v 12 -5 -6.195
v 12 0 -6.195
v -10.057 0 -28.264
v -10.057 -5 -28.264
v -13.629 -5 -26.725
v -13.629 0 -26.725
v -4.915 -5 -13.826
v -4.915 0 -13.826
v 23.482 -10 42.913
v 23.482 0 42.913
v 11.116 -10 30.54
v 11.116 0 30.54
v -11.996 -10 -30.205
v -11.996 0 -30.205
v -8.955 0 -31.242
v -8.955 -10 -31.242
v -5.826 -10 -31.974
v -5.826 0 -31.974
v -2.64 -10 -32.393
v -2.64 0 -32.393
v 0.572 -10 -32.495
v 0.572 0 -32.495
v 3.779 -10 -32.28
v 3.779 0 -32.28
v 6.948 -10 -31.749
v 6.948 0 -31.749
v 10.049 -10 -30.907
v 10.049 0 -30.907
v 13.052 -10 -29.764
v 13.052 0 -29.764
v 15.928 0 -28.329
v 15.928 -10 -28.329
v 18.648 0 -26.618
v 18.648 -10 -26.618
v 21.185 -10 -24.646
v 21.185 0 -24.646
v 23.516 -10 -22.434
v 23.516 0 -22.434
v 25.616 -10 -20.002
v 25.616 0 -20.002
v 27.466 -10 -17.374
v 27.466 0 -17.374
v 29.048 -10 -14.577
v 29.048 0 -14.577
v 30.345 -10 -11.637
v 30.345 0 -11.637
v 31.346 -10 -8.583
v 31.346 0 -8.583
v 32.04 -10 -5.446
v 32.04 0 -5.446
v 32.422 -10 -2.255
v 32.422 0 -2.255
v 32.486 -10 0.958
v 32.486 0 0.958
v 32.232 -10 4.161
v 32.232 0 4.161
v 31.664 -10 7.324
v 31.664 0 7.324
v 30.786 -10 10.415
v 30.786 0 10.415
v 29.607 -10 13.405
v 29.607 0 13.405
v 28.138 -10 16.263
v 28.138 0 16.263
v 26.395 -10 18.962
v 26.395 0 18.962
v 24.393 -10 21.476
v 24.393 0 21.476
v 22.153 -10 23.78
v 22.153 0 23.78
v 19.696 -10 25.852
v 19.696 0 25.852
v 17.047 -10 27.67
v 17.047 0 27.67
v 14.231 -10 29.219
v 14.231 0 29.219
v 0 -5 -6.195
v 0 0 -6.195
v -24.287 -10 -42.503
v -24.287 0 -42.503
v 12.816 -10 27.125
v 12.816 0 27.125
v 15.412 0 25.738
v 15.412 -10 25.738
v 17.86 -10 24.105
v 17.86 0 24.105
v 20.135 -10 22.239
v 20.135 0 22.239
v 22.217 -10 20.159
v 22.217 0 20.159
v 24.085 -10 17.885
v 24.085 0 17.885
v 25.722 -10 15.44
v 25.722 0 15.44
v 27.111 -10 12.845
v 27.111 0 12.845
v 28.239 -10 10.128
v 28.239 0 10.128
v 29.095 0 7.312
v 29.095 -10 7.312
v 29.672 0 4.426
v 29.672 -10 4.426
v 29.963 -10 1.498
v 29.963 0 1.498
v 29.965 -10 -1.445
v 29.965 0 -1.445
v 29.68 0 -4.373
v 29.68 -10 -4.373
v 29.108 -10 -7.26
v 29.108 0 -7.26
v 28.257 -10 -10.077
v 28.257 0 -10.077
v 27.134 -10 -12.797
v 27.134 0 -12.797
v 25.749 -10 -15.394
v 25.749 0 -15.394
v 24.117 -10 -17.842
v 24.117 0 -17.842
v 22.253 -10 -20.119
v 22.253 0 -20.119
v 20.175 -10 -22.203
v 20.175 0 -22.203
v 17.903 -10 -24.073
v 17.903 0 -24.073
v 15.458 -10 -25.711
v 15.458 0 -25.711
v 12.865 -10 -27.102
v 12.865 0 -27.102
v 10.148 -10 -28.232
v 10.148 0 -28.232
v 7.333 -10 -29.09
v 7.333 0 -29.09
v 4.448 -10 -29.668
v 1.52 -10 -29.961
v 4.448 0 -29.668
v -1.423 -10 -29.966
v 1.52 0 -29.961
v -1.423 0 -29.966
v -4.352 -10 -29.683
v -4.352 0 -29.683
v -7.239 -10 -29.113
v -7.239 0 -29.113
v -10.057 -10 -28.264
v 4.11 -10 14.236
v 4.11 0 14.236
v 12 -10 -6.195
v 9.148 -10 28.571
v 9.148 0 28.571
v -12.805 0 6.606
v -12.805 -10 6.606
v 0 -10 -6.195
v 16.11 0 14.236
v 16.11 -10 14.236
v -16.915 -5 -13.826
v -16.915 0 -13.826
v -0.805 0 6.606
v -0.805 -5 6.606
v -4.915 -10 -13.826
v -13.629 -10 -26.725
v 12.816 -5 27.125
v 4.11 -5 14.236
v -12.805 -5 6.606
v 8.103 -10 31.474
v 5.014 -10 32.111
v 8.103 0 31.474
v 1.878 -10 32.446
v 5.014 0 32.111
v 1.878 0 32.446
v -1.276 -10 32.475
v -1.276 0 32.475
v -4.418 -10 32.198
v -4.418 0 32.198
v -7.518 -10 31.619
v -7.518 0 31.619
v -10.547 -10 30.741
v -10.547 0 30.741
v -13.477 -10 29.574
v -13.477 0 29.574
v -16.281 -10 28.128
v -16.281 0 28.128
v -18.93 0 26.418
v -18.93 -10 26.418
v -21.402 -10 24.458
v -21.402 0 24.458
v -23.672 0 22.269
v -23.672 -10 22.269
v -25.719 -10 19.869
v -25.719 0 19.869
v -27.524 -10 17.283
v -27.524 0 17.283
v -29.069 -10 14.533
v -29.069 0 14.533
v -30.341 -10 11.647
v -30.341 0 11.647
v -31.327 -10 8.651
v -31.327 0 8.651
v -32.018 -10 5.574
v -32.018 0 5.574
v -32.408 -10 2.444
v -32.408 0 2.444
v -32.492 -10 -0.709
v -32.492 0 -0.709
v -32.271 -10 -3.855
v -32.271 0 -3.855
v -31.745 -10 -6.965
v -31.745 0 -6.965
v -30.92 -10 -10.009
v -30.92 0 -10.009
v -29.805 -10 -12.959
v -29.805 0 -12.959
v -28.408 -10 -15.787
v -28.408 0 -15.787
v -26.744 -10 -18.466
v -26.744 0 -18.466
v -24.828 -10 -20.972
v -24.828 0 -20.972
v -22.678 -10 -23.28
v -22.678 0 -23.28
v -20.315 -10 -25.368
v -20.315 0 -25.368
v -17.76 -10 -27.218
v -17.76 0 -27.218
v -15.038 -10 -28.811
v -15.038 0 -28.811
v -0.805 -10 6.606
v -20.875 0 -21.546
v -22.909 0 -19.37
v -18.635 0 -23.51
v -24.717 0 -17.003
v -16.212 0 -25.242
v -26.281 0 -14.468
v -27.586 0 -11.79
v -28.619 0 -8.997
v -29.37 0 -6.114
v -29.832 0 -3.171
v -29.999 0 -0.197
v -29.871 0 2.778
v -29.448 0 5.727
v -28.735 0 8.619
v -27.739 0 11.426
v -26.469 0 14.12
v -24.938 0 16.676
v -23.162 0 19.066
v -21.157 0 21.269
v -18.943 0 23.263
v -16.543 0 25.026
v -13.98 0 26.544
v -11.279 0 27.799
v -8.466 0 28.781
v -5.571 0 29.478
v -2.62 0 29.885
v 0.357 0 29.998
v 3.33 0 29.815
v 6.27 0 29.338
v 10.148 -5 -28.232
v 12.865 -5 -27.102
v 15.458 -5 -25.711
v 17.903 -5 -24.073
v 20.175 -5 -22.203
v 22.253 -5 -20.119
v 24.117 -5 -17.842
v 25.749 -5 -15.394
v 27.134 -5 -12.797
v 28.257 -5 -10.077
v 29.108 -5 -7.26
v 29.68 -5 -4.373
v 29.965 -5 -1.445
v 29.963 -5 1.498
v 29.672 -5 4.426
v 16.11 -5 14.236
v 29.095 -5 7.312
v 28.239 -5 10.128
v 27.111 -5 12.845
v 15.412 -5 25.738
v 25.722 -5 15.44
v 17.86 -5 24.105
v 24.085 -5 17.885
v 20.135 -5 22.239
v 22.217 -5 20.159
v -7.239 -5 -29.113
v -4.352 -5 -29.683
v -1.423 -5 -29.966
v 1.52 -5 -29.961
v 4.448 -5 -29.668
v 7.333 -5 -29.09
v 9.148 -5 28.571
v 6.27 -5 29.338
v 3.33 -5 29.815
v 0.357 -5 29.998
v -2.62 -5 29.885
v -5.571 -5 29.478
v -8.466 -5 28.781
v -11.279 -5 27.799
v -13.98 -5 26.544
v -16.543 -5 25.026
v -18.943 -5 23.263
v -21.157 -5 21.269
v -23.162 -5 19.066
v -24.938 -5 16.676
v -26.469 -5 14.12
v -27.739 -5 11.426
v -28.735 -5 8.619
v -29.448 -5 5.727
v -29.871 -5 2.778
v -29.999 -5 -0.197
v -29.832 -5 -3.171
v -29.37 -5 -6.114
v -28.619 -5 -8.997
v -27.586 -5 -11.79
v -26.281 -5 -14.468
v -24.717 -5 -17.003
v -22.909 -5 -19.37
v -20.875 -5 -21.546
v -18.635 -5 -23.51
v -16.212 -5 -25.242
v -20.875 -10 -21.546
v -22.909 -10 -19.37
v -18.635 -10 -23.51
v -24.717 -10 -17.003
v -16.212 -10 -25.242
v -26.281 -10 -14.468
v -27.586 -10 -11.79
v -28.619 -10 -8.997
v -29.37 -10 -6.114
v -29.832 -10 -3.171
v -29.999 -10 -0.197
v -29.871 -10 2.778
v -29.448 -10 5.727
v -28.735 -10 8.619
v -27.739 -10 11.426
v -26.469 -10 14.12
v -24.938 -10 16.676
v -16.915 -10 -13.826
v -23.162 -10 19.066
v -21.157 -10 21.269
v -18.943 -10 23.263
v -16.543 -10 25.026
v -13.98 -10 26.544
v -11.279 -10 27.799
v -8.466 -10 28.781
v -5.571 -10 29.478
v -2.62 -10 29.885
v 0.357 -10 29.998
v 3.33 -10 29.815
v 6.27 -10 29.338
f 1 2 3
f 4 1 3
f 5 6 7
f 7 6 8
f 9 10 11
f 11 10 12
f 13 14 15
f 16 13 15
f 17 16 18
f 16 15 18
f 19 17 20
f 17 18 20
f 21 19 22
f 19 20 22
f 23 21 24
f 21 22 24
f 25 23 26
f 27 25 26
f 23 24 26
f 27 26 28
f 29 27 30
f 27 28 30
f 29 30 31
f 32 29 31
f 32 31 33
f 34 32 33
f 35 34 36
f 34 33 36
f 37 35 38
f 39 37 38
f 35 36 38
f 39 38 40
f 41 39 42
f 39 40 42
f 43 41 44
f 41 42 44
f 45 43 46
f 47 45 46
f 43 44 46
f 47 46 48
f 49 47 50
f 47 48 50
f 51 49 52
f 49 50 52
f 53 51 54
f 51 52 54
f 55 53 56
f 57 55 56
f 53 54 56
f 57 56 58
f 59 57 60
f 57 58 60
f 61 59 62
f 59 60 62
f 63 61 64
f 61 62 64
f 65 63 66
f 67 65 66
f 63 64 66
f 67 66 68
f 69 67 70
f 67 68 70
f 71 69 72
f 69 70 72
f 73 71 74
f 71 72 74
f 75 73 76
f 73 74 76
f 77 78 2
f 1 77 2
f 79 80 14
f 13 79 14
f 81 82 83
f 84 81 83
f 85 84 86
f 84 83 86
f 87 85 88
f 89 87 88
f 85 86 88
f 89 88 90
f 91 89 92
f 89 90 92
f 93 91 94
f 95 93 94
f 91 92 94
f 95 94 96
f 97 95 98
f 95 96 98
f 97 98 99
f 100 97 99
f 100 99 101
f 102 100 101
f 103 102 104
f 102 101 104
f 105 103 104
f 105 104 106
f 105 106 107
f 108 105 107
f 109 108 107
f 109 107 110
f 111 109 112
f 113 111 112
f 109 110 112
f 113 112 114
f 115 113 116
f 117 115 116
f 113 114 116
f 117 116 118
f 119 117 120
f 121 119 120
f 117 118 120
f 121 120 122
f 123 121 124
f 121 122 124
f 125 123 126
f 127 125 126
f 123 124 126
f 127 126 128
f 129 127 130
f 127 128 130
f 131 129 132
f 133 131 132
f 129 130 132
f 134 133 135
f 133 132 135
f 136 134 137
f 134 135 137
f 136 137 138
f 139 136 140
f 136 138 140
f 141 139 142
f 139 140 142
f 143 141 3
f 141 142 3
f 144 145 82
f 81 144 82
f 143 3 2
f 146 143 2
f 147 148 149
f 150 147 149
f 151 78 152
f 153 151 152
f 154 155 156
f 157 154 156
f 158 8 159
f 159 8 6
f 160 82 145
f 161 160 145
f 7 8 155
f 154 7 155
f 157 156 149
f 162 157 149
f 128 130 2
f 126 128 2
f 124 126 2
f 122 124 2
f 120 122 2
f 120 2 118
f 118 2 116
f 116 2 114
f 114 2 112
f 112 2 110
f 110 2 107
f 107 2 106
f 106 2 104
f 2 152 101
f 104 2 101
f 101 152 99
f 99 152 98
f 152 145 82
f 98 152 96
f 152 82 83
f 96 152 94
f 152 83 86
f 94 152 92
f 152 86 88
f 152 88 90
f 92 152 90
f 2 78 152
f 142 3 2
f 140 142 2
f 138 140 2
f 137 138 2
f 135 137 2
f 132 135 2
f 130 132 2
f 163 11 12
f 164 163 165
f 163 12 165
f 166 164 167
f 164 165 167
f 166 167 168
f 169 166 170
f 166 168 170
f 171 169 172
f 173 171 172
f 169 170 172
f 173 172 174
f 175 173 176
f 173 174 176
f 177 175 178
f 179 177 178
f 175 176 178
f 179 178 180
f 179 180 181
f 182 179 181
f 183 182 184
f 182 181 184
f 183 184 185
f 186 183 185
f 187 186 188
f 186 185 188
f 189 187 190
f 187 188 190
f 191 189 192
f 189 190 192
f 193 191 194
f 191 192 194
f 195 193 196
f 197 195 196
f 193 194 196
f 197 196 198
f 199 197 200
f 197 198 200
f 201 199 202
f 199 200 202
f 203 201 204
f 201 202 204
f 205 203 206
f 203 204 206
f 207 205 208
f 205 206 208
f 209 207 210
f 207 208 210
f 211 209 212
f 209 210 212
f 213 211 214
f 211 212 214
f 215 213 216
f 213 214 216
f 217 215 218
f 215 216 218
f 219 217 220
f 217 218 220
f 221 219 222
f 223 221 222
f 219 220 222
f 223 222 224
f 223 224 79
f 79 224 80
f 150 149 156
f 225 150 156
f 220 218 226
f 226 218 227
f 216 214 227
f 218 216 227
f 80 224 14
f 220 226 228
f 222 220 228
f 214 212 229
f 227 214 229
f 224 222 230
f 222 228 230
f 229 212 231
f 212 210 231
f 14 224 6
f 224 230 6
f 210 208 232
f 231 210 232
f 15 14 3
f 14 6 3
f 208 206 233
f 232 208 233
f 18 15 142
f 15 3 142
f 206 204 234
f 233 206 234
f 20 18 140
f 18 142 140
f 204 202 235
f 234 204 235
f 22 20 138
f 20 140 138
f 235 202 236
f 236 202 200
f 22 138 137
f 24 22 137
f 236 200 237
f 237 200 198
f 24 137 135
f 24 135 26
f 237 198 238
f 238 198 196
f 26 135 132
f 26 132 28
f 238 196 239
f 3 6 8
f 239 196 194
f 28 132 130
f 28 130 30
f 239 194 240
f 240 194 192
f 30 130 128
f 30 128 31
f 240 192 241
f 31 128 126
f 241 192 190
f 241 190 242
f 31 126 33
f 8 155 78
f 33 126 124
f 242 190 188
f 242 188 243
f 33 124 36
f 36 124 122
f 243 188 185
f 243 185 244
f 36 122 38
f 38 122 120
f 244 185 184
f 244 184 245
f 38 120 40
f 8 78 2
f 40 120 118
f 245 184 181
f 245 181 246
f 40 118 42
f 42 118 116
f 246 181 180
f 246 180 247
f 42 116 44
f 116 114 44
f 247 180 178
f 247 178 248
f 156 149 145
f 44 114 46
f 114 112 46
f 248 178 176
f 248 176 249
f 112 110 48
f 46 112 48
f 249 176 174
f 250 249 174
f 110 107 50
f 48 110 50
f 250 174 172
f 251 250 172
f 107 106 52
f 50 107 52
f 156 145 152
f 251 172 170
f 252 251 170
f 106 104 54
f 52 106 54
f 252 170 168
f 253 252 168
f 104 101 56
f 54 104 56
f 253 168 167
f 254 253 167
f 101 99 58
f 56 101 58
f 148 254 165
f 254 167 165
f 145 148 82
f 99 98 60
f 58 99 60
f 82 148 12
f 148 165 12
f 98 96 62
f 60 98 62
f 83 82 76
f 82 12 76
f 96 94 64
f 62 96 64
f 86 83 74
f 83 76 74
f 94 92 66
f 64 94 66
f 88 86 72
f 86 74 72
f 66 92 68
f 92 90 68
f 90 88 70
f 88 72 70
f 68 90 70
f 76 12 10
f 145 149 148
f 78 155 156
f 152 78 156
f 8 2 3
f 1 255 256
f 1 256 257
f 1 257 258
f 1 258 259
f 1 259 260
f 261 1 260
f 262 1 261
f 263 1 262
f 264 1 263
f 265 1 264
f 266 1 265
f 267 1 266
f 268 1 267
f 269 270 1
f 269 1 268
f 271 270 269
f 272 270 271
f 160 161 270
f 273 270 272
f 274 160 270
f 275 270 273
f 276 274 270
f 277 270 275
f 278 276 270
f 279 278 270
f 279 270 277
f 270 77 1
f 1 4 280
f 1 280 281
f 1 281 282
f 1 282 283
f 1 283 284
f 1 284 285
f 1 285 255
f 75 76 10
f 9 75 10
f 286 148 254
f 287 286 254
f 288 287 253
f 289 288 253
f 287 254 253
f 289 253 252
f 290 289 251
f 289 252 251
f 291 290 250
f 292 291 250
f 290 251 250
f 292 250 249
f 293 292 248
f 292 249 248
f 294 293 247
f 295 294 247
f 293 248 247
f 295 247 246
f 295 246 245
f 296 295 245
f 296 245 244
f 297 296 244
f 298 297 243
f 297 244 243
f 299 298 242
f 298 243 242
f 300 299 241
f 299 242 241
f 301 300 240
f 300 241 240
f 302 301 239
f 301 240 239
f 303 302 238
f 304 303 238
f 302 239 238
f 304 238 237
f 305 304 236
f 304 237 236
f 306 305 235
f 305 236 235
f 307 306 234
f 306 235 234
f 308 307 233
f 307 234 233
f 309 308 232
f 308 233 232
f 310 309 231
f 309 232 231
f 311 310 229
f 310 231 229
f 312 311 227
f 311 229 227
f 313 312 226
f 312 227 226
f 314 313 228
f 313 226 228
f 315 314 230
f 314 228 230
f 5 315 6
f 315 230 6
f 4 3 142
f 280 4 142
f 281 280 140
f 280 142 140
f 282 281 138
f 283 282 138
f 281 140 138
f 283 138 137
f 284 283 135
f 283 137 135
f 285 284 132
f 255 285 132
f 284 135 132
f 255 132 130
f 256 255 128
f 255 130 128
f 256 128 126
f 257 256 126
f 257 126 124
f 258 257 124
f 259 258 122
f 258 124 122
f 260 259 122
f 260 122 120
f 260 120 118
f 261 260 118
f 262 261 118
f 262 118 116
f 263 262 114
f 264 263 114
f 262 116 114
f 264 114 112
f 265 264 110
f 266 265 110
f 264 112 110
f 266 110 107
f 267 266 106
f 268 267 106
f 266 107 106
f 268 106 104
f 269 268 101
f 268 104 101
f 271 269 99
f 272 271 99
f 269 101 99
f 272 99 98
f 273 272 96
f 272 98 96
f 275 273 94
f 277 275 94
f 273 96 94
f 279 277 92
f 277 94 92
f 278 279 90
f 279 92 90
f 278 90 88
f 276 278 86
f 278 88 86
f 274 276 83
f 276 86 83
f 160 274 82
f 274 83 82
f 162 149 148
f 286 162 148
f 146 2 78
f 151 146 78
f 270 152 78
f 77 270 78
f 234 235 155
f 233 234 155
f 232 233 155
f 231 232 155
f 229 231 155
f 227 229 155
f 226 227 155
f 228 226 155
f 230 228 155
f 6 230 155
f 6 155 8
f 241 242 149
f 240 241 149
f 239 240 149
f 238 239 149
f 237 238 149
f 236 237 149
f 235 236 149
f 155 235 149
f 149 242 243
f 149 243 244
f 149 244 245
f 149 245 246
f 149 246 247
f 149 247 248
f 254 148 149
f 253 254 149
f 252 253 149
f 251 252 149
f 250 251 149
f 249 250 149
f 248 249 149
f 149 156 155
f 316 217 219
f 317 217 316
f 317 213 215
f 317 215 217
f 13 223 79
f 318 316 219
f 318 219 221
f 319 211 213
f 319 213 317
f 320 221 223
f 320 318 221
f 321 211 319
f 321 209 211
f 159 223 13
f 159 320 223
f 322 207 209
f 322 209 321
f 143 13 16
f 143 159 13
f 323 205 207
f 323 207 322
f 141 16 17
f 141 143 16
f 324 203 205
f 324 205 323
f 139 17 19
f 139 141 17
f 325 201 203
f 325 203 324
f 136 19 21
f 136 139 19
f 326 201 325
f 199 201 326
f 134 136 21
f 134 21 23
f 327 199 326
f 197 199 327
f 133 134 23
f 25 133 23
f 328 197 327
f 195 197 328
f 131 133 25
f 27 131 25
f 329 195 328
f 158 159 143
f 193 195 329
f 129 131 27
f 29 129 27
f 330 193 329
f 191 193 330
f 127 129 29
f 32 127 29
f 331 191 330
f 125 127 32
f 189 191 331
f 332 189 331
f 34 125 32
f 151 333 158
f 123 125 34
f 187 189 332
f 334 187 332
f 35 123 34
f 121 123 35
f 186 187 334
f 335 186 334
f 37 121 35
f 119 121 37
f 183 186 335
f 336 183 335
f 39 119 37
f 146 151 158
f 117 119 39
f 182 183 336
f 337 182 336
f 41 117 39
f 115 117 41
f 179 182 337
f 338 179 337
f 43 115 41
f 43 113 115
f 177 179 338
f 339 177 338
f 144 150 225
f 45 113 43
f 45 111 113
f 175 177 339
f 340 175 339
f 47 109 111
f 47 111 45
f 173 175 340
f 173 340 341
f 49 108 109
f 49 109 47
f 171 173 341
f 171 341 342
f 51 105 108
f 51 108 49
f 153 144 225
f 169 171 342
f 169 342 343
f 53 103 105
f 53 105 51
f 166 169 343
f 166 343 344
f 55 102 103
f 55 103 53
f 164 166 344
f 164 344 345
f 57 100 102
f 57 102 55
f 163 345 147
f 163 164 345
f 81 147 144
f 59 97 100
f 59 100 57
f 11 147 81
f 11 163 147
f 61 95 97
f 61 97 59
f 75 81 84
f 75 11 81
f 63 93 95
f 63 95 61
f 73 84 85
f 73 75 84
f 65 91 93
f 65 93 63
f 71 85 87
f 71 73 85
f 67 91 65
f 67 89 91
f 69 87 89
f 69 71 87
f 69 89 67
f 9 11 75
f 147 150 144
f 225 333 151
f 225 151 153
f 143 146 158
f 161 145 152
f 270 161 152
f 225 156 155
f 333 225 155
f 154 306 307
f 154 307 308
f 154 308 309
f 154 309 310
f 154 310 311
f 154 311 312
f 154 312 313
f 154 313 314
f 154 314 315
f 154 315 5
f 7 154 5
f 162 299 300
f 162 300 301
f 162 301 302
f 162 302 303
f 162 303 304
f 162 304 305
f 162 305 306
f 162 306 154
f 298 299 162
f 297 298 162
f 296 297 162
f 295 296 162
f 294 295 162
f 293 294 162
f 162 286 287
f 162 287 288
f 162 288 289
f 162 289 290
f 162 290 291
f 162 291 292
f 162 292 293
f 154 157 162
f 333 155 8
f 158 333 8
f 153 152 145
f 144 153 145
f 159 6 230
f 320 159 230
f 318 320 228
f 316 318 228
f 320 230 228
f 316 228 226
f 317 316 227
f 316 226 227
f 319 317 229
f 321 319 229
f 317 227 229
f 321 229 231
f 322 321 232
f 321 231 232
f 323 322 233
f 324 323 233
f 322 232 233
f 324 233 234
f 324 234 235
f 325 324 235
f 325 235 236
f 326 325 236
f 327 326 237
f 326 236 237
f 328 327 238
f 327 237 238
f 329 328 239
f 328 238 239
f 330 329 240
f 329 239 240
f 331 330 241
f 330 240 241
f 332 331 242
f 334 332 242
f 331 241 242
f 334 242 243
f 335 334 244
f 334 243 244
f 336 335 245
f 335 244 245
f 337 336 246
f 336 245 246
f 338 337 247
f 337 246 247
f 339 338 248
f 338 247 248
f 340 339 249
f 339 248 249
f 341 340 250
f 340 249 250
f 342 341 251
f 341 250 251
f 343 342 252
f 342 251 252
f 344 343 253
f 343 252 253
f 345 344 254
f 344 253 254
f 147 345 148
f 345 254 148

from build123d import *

# Parameters (mm, degrees)
F1_DEPTH = 5
F2_DEPTH = 10


with BuildPart() as f1:
    # F0 (on Front) → F1 (new body)
    with BuildSketch(Plane.XZ):
        with BuildLine():
            Line((-12.80524, 6.605562), (9.148154, 28.571162))
            ThreePointArc((9.148154, 28.571162), (-27.738901, 11.425995), (-13.629171, -26.725376))
            Line((-13.629171, -26.725376), (-4.914949, -13.825553))
            Line((-4.914949, -13.825553), (-16.914949, -13.825553))
            Line((-16.914949, -13.825553), (-0.80524, 6.605562))
            Line((-0.80524, 6.605562), (-12.80524, 6.605562))
        make_face()
        with BuildLine():
            ThreePointArc((-10.056576, -28.264205), (27.728711, -11.450703), (12.816452, 27.124501))
            Line((12.816452, 27.124501), (4.10971, 14.23575))
            Line((4.10971, 14.23575), (16.10971, 14.23575))
            Line((16.10971, 14.23575), (0, -6.195365))
            Line((0, -6.195365), (12, -6.195365))
            Line((12, -6.195365), (-10.056576, -28.264205))
        make_face()
    extrude(amount=F1_DEPTH)


with BuildPart() as f2:
    # F0 (on Front) → F2 (new body)
    with BuildSketch(Plane.XZ):
        Polygon((11.115841, 30.539942), (9.148154, 28.571162), (-12.80524, 6.605562), (-0.80524, 6.605562), (-16.914949, -13.825553), (-4.914949, -13.825553), (-13.629171, -26.725376), (-15.038356, -28.811419), (-24.287384, -42.502925), (-11.996257, -30.204964), (-10.056576, -28.264205), (12, -6.195365), (0, -6.195365), (16.10971, 14.23575), (4.10971, 14.23575), (12.816452, 27.124501), (14.231078, 29.218597), (23.482144, 42.913122), align=None)
        with BuildLine():
            ThreePointArc((-13.629171, -26.725376), (-27.738901, 11.425995), (9.148154, 28.571162))
            Line((9.148154, 28.571162), (11.115841, 30.539942))
            ThreePointArc((11.115841, 30.539942), (-29.740419, 13.105627), (-15.038356, -28.811419))
            Line((-15.038356, -28.811419), (-13.629171, -26.725376))
        make_face()
        with BuildLine():
            ThreePointArc((-11.996257, -30.204964), (29.732785, -13.122938), (14.231078, 29.218597))
            Line((14.231078, 29.218597), (12.816452, 27.124501))
            ThreePointArc((12.816452, 27.124501), (27.728711, -11.450703), (-10.056576, -28.264205))
            Line((-10.056576, -28.264205), (-11.996257, -30.204964))
        make_face()
    extrude(amount=F2_DEPTH)


solid = Compound([f1.part, f2.part])
